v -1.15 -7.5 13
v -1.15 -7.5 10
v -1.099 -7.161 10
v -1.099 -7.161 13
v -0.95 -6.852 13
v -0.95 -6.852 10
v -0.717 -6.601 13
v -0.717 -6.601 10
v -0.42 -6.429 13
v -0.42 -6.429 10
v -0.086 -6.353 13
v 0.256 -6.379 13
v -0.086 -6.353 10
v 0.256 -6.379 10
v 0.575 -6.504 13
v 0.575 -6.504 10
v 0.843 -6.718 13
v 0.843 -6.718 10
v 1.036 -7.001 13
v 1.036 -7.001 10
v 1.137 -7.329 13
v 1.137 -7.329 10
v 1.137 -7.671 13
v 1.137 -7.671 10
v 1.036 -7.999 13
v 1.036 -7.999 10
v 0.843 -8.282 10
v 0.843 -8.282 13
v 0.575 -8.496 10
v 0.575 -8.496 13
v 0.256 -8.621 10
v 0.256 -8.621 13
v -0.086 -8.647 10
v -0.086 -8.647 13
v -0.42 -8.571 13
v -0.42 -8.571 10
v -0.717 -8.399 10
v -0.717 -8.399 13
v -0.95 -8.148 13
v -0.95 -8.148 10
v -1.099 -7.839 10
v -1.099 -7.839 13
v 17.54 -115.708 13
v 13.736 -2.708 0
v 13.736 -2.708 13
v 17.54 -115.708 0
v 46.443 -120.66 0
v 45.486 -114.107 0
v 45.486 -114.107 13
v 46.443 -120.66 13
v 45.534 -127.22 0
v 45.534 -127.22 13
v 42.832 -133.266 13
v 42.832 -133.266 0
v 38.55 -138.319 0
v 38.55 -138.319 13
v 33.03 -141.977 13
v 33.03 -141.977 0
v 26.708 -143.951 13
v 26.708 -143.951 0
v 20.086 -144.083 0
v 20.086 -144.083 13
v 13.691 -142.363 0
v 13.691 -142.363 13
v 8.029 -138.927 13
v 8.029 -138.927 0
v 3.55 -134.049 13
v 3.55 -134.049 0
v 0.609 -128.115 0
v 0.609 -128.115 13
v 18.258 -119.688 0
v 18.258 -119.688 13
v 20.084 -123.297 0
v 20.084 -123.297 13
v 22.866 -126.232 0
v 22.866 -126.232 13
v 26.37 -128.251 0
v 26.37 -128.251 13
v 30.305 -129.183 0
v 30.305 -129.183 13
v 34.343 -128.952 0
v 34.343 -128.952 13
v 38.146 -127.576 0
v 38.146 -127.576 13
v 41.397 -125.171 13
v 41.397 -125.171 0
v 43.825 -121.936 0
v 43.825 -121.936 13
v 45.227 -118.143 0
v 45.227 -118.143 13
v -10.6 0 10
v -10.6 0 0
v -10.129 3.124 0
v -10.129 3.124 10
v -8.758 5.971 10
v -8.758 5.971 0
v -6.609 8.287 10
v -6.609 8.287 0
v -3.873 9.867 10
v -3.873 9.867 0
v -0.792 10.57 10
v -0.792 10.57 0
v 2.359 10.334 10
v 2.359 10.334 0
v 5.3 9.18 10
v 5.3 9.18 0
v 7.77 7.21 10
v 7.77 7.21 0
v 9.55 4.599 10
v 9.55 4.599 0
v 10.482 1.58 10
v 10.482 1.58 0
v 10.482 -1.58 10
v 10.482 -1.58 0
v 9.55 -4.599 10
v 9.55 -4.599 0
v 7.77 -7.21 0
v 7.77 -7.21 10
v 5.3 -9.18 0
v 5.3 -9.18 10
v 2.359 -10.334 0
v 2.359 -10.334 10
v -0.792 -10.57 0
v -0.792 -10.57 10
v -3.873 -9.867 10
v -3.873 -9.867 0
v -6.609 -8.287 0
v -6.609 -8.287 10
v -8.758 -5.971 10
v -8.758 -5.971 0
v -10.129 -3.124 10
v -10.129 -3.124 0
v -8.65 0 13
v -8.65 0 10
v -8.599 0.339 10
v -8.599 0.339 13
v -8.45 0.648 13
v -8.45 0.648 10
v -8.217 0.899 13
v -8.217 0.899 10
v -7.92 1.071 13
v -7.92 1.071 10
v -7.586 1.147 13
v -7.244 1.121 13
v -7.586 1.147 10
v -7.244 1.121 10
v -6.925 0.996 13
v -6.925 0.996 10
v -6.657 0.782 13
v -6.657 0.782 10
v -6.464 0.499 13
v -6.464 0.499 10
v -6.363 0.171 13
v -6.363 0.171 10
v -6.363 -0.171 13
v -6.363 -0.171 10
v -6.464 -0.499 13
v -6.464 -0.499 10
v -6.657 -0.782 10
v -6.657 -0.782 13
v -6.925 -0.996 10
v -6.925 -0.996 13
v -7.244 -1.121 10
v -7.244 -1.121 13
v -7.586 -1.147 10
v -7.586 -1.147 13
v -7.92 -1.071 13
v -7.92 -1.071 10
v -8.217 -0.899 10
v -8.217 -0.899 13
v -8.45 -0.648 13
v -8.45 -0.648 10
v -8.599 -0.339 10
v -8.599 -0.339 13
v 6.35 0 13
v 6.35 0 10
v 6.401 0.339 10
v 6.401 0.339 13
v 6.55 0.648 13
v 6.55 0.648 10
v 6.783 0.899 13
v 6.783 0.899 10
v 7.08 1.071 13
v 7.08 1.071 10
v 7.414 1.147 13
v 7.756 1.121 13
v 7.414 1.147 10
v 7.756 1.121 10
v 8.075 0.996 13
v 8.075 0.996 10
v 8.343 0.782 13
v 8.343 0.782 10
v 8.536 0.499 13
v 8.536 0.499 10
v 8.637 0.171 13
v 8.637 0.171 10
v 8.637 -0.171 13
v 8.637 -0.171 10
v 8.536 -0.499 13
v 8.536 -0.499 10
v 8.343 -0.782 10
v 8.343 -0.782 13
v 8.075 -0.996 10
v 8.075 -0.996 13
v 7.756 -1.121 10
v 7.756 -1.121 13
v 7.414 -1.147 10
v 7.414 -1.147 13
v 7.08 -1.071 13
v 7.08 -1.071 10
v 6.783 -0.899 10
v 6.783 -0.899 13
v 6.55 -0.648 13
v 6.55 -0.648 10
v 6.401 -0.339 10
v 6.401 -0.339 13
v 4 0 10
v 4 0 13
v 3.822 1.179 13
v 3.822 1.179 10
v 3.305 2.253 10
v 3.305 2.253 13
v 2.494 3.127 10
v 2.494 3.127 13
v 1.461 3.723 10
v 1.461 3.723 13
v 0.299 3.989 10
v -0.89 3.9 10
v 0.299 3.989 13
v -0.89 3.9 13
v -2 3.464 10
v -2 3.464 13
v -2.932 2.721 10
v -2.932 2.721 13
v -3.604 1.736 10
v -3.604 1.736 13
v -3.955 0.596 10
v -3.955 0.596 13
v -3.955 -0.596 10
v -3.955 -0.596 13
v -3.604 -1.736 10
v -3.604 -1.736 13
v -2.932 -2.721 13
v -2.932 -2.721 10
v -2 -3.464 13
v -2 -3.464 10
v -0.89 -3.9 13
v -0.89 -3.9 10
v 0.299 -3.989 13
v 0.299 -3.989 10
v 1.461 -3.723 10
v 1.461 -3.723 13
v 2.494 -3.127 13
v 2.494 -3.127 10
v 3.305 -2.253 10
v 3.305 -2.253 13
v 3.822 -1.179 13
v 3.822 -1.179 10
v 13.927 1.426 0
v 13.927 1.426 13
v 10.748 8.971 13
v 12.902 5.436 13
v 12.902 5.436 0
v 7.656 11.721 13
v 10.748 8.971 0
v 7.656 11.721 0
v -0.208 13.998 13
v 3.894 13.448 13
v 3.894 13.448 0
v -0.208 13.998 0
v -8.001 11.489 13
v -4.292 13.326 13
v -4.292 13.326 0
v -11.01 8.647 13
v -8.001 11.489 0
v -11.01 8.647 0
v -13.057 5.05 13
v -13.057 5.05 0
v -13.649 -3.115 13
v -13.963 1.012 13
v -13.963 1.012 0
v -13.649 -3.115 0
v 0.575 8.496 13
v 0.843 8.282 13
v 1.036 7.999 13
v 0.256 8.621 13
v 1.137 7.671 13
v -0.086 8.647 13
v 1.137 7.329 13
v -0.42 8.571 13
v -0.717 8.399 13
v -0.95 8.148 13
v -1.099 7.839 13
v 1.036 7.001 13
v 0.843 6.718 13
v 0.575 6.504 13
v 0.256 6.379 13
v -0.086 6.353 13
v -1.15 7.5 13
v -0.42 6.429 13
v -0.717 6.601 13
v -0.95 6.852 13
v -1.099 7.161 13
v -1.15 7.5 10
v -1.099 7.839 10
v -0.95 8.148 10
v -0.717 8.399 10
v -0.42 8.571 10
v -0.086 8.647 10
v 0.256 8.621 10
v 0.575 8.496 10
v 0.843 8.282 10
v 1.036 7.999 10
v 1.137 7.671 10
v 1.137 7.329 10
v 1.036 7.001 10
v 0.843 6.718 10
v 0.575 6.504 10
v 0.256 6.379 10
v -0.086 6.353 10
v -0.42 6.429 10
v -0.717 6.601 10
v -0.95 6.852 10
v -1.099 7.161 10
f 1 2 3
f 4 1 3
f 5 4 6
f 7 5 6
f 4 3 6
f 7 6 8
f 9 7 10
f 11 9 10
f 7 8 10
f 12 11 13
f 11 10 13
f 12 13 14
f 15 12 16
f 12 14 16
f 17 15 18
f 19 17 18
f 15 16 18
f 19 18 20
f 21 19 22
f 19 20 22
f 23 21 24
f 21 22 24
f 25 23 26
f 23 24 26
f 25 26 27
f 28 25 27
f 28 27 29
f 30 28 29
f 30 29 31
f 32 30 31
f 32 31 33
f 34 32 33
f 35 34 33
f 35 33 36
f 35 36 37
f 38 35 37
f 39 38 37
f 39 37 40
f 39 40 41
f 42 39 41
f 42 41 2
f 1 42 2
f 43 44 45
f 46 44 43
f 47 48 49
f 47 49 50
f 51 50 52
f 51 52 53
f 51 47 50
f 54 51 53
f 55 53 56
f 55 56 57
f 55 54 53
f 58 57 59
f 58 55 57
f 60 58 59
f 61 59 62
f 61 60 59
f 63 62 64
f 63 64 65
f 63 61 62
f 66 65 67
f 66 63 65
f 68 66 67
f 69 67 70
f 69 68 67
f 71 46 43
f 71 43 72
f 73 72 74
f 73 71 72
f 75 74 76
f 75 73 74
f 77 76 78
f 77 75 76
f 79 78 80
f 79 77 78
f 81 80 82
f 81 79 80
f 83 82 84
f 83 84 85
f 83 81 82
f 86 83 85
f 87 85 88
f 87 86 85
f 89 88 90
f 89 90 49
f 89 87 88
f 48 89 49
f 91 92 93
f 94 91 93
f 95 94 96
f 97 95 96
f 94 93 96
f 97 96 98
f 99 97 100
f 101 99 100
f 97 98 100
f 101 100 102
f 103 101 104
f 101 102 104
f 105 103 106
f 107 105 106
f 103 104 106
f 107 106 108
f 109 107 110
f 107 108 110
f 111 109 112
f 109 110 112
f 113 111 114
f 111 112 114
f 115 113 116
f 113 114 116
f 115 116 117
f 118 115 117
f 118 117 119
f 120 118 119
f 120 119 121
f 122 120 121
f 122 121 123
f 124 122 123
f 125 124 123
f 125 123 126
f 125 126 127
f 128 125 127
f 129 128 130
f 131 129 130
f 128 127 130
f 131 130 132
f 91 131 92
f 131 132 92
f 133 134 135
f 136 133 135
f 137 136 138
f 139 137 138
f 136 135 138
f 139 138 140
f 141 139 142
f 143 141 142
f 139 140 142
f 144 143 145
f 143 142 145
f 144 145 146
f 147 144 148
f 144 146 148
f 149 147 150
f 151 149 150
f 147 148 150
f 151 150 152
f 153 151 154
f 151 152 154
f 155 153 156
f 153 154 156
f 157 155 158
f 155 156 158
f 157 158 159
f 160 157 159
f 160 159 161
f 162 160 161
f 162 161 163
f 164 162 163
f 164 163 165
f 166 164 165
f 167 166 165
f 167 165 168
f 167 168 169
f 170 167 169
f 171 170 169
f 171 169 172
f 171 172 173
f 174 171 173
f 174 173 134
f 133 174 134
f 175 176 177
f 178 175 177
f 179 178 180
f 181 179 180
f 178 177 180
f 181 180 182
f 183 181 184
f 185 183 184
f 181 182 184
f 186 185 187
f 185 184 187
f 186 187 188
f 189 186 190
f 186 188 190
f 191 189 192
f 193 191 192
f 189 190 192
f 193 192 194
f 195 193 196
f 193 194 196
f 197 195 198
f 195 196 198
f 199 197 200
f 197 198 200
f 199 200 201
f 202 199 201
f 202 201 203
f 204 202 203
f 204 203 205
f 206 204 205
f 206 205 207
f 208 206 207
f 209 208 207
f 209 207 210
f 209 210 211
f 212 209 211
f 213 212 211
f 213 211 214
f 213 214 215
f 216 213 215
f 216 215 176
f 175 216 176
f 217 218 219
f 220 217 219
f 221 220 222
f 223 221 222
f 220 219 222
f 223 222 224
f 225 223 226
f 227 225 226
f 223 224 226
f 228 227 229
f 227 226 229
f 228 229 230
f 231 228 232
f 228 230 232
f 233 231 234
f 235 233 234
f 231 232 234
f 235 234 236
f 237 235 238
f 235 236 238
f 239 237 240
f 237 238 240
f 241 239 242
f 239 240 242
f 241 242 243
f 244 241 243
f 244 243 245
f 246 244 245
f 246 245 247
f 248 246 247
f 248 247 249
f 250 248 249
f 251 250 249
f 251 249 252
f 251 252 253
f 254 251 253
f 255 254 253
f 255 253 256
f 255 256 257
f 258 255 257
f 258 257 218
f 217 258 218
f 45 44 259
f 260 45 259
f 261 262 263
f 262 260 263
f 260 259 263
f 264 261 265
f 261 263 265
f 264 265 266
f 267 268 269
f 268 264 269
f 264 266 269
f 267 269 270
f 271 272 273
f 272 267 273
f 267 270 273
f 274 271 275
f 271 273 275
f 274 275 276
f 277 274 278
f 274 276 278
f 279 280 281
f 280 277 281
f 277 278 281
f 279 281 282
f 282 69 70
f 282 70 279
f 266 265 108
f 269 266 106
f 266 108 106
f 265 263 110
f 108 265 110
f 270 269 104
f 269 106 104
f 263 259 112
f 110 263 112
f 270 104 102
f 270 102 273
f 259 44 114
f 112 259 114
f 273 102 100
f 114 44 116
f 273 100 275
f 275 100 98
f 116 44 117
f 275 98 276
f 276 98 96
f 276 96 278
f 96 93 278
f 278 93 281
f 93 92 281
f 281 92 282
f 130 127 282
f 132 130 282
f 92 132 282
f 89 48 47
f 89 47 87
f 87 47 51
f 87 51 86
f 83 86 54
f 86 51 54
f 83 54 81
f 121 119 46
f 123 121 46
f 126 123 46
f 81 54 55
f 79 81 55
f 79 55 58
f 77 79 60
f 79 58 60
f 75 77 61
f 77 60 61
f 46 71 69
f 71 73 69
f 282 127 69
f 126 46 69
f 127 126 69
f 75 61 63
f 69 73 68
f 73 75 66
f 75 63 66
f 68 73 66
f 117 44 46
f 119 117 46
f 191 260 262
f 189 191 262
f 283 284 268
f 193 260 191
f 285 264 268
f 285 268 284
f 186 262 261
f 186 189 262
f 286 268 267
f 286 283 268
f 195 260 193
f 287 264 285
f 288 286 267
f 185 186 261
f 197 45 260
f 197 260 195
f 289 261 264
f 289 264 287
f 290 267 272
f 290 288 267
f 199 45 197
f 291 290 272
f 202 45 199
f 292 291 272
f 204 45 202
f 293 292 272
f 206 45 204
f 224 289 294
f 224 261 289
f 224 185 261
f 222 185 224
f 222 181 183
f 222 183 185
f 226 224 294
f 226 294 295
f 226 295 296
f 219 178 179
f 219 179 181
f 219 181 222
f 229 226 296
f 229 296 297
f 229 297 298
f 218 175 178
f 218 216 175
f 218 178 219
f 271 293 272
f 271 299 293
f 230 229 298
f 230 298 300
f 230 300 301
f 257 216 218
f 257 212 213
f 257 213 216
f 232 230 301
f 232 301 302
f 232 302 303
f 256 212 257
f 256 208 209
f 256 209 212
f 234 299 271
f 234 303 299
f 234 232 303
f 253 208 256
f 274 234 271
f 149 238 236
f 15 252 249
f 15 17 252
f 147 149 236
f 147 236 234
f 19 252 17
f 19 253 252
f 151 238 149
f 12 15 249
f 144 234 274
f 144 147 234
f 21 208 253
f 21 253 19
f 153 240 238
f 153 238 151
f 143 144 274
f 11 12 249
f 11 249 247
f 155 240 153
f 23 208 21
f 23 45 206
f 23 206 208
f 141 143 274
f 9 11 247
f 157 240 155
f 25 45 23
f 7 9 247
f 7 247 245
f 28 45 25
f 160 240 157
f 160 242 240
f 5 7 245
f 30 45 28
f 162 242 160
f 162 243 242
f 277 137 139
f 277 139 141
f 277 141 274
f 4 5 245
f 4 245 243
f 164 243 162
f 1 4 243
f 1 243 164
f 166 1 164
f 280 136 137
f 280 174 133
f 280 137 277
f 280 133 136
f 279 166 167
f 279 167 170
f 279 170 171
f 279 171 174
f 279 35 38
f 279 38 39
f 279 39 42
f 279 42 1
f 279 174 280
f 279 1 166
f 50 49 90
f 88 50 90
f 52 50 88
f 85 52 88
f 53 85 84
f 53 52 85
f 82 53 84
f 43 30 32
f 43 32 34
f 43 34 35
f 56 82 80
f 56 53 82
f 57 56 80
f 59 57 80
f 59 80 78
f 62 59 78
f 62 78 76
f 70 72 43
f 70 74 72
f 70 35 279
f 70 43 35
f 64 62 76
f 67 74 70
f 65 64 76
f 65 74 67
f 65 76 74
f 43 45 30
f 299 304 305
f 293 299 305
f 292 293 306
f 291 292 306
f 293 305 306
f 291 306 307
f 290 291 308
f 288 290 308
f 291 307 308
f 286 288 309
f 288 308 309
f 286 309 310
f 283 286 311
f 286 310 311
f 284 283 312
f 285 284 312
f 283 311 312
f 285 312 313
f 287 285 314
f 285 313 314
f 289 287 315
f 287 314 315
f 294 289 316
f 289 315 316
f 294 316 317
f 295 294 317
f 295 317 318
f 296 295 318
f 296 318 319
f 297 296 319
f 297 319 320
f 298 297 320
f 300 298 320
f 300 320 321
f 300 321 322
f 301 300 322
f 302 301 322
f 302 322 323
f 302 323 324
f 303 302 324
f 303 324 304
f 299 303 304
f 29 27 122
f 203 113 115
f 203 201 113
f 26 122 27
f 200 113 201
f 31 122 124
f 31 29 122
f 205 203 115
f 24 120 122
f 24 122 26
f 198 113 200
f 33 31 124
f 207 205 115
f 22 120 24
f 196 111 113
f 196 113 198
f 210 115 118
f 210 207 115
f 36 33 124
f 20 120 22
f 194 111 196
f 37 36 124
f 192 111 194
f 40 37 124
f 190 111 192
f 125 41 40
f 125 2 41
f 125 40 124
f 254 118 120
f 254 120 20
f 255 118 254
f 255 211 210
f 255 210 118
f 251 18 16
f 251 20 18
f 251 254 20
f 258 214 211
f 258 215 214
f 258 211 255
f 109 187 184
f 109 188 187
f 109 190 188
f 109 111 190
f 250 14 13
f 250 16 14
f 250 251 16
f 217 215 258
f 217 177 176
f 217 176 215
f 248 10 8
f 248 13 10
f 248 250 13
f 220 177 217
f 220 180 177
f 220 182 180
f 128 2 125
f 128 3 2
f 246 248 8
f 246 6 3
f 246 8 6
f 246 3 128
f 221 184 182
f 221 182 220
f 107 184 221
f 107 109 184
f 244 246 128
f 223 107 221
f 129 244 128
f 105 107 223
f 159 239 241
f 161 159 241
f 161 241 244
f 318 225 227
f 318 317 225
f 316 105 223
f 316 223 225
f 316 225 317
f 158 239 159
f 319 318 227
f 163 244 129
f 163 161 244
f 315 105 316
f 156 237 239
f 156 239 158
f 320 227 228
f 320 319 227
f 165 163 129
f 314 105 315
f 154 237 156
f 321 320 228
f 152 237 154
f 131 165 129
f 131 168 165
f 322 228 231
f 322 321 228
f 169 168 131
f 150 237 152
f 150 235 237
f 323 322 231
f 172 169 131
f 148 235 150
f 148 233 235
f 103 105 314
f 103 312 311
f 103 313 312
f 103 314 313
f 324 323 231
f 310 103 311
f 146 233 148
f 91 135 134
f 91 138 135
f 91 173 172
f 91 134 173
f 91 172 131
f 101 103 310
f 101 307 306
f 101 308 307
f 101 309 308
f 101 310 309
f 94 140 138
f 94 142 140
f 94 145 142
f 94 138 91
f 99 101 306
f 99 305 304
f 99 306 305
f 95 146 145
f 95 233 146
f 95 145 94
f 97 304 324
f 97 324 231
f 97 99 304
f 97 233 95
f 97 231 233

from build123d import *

# Parameters (mm, degrees)
SKETCH_1_R          = 14
EXTRUDE_1_DEPTH     = 13
SKETCH_2_R          = 10.6
CUT_EXTRUDE_1_DEPTH = 10
SKETCH_3_R          = 4
CUT_EXTRUDE_2_DEPTH = 10
EXTRUDE_START       = -13
EXTRUDE_3_DEPTH     = 13
SKETCH_7_R          = 1.15
CUT_EXTRUDE_3_DEPTH = 14


with BuildPart() as part:
    # 스케치1 → 보스-돌출1 (new body)
    with BuildSketch(Plane.XY):
        with Locations(Location((0, 0, 0), (0, 0, 180))):
            Circle(SKETCH_1_R)
    extrude(amount=EXTRUDE_1_DEPTH)

    # 스케치2 → 컷-돌출1 (cut)
    with BuildSketch(Plane(origin=(0, 0, 0), x_dir=(-1, 0, 0), z_dir=(0, 0, -1))):
        Circle(SKETCH_2_R)
    extrude(amount=-CUT_EXTRUDE_1_DEPTH, mode=Mode.SUBTRACT)

    # 스케치3 → 컷-돌출2 (cut)
    with BuildSketch(Plane.XY.offset(13)):
        Circle(SKETCH_3_R)
    extrude(amount=-CUT_EXTRUDE_2_DEPTH, mode=Mode.SUBTRACT)

    # 스케치6 → 보스-돌출3 (add)
    with BuildSketch(Plane.XY.offset(13).offset(EXTRUDE_START)):
        with BuildLine():
            Line((13.735578357, -2.708115061), (17.539668143, -115.708115061))
            ThreePointArc((17.539668143, -115.708115061), (32.332669837, -129.214149758), (45.486033392, -114.10670459))
            ThreePointArc((45.486033392, -114.10670459), (29.938586036, -143.187708961), (0.608578272, -128.115264599))
            Line((0.608578272, -128.115264599), (-13.64899727, -3.115264599))
            ThreePointArc((-13.64899727, -3.115264599), (0.208126783, -13.998452887), (13.735578357, -2.708115061))
        make_face()
    extrude(amount=EXTRUDE_3_DEPTH)

    # 스케치7 → 컷-돌출3 (cut)
    with BuildSketch(Plane(origin=(0, 0, 10), x_dir=(-1, 0, 0), z_dir=(0, 0, -1))):
        with Locations((7.5, 0)):
            Circle(SKETCH_7_R)
        with Locations((0, -7.5)):
            Circle(SKETCH_7_R)
        with Locations((-7.5, 0)):
            Circle(SKETCH_7_R)
        with Locations((0, 7.5)):
            Circle(SKETCH_7_R)
    extrude(amount=-CUT_EXTRUDE_3_DEPTH, mode=Mode.SUBTRACT)


solid = part.part
